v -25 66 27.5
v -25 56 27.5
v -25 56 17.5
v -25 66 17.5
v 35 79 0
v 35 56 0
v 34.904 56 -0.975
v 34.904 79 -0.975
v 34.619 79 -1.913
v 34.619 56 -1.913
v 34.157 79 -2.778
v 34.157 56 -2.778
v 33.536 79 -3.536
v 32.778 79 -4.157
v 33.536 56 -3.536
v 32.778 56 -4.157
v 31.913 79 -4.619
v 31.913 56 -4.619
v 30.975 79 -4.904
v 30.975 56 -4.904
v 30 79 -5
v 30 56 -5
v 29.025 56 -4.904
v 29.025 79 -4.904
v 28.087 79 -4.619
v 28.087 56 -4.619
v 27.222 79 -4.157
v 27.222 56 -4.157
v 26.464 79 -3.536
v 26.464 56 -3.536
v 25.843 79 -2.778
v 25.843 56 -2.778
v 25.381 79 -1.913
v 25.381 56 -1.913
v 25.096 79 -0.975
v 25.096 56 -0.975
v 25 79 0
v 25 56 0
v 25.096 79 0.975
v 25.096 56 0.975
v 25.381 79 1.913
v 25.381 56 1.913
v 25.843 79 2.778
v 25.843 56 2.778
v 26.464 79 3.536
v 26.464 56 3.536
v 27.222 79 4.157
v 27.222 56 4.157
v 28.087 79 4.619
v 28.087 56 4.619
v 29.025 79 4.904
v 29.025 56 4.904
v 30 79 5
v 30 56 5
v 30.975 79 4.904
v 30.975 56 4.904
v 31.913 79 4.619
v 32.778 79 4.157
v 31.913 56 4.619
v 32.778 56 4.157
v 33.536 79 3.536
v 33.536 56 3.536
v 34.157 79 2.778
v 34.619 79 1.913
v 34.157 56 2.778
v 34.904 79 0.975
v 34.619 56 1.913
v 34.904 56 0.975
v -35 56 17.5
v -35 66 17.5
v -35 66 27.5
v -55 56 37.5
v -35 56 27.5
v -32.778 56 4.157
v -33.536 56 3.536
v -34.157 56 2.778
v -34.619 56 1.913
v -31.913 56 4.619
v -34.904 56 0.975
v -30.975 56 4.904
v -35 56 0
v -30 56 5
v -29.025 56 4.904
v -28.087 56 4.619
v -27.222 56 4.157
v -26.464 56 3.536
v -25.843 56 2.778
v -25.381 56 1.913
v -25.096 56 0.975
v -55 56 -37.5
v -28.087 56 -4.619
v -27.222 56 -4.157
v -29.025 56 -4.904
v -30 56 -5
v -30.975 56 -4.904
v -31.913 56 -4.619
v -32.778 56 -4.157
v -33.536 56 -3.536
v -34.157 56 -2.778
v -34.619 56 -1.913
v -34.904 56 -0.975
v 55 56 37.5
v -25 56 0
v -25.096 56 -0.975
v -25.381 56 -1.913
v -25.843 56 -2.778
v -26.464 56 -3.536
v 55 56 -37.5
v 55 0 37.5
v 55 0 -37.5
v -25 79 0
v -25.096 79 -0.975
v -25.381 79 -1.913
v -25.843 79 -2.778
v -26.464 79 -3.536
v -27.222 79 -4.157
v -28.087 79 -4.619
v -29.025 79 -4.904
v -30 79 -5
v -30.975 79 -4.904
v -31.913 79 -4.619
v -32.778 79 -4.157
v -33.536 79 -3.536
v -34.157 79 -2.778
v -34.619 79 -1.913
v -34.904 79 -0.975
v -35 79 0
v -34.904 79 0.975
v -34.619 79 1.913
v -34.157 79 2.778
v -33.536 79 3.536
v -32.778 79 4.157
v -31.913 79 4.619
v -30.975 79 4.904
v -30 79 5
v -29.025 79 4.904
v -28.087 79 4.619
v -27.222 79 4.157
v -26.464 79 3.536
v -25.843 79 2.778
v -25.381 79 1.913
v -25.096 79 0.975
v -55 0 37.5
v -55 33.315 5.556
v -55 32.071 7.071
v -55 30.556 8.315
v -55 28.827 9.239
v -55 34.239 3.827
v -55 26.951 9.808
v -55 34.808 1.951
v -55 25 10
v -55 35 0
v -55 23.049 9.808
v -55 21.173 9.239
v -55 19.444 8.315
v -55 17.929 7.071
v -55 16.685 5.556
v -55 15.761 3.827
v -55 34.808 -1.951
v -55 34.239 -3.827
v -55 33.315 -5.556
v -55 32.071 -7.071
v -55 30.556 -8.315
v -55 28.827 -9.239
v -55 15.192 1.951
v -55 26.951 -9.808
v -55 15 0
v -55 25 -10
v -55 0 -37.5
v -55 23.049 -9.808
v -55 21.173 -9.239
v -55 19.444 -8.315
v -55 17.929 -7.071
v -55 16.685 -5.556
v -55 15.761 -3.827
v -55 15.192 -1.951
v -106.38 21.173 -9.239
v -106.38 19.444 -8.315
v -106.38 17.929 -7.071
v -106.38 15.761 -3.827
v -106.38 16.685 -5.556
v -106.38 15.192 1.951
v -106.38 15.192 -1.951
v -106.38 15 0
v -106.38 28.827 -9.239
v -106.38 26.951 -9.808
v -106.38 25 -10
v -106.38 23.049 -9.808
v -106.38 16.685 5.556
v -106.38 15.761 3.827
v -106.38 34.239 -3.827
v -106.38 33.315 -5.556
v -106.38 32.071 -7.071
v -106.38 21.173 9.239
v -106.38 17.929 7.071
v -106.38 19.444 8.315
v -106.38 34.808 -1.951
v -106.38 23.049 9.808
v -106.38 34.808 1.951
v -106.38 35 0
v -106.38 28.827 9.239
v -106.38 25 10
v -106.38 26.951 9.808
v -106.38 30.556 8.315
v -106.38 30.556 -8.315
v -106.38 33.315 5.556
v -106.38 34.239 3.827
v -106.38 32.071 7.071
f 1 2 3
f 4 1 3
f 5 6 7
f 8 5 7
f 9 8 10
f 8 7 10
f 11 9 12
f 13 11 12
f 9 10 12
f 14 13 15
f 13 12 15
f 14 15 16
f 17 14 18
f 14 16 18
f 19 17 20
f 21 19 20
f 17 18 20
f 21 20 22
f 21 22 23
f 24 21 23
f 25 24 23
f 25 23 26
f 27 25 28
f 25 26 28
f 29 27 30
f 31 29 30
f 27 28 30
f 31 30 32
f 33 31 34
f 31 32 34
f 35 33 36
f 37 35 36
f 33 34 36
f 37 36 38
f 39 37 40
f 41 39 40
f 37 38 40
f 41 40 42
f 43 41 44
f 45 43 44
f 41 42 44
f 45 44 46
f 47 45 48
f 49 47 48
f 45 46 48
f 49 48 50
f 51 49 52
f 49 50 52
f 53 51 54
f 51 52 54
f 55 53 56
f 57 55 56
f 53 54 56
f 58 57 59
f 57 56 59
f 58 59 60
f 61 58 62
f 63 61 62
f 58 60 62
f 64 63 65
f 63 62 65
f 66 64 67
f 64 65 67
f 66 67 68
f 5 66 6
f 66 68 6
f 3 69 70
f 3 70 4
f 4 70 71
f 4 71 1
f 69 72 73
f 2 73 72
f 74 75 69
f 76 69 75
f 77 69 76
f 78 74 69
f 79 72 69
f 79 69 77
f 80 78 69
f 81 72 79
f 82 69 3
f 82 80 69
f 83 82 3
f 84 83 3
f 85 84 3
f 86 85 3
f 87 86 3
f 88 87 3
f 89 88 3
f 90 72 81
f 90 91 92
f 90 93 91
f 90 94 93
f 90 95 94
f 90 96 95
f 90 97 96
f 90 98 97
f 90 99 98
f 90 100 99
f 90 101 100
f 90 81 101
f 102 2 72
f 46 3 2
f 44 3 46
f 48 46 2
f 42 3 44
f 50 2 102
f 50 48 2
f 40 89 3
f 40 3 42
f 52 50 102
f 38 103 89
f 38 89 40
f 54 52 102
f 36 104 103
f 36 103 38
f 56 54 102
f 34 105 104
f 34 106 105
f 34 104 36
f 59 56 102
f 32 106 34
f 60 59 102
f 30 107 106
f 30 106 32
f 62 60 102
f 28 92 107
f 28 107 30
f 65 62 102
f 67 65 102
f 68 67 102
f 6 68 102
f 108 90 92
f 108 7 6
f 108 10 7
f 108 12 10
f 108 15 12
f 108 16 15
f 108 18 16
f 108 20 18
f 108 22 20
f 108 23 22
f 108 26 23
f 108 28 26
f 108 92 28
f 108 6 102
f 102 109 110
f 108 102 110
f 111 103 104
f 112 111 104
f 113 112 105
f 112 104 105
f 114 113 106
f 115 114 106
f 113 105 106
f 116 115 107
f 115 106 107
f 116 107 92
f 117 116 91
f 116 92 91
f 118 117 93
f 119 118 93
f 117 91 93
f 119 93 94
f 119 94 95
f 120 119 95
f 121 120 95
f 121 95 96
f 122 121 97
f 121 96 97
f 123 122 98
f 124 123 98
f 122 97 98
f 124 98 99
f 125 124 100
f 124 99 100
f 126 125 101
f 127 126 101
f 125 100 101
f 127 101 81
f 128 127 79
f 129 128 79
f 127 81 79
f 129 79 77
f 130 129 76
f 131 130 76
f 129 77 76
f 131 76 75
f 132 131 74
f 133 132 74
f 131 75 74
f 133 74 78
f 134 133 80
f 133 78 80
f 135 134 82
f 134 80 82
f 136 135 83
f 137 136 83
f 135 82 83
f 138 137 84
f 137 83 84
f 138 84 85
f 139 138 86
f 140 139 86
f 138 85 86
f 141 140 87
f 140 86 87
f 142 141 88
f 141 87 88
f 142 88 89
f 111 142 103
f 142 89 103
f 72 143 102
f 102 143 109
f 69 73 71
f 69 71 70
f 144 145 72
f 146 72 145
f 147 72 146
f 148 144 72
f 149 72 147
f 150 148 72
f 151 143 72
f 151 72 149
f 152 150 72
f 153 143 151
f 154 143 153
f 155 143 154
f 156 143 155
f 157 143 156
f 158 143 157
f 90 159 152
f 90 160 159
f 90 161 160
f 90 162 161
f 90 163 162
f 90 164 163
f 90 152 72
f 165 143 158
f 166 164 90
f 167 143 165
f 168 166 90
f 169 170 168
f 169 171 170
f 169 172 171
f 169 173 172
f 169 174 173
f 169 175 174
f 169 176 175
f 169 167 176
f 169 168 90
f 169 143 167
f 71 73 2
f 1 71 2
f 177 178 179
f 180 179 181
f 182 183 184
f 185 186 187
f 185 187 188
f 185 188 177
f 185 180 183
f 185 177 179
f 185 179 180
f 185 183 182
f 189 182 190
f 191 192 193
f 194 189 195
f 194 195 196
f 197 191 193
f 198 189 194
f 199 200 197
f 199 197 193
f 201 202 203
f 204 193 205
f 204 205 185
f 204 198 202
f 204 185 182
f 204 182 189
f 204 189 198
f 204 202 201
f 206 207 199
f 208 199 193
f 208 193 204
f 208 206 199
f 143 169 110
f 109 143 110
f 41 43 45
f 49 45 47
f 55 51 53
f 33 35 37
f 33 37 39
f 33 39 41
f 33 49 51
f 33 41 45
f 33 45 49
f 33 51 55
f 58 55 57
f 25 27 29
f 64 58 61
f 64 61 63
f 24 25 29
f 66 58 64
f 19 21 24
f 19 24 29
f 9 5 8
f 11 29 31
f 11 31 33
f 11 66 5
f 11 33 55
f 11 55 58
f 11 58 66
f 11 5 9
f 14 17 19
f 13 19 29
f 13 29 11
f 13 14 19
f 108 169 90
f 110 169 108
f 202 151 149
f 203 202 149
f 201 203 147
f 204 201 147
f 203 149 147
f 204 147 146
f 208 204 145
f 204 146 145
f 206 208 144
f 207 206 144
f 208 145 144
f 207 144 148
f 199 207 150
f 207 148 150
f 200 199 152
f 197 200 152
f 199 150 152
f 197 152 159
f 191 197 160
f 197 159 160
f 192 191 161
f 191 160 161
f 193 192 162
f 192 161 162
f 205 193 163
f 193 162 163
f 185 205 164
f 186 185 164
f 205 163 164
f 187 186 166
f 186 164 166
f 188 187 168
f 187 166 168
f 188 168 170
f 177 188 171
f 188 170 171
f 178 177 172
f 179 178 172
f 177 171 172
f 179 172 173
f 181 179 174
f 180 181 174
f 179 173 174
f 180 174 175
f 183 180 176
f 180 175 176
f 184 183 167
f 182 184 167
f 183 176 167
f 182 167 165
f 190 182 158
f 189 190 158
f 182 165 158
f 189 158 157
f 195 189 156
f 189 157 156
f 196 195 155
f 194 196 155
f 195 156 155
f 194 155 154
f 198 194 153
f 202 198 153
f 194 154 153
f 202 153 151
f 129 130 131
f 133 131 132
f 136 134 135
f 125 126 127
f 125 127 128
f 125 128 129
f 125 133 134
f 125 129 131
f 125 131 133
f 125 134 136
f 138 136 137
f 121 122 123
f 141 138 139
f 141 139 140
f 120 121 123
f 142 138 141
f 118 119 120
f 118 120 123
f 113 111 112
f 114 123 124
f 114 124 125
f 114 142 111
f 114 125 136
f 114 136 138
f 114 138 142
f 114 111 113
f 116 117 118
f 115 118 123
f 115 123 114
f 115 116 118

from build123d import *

# Parameters (mm, degrees)
SKETCH2_W           = 110
SKETCH2_H           = 75
BASE_DEPTH          = 56
SKETCH3_R           = 5
HV_CONNECTORS_DEPTH = 23
SKETCH4_R           = 10
LV_CONNECTOR_DEPTH  = 51.38
SKETCH5_W           = 10
SKETCH5_H           = 10
HV_CONNECTOR_DEPTH  = 10


with BuildPart() as part:
    # Sketch2 → Base (new body)
    with BuildSketch(Plane(origin=(0, 0, 0), x_dir=(1, 0, 0), z_dir=(0, 1, 0))):
        Rectangle(SKETCH2_W, SKETCH2_H)
    extrude(amount=BASE_DEPTH)

    # Sketch3 → HV- Connectors (add)
    with BuildSketch(Plane(origin=(0, 56, 0), x_dir=(1, 0, 0), z_dir=(0, 1, 0))):
        with Locations((30, 0)):
            Circle(SKETCH3_R)
        with Locations((-30, 0)):
            Circle(SKETCH3_R)
    extrude(amount=HV_CONNECTORS_DEPTH)

    # Sketch4 → LV Connector (add)
    with BuildSketch(Plane.ZY.offset(55)):
        with Locations((0, 25)):
            Circle(SKETCH4_R)
    extrude(amount=LV_CONNECTOR_DEPTH)

    # Sketch5 → HV+ Connector (add)
    with BuildSketch(Plane(origin=(0, 56, 0), x_dir=(1, 0, 0), z_dir=(0, 1, 0))):
        with Locations((-30, -22.5)):
            Rectangle(SKETCH5_W, SKETCH5_H)
    extrude(amount=HV_CONNECTOR_DEPTH)


solid = part.part
